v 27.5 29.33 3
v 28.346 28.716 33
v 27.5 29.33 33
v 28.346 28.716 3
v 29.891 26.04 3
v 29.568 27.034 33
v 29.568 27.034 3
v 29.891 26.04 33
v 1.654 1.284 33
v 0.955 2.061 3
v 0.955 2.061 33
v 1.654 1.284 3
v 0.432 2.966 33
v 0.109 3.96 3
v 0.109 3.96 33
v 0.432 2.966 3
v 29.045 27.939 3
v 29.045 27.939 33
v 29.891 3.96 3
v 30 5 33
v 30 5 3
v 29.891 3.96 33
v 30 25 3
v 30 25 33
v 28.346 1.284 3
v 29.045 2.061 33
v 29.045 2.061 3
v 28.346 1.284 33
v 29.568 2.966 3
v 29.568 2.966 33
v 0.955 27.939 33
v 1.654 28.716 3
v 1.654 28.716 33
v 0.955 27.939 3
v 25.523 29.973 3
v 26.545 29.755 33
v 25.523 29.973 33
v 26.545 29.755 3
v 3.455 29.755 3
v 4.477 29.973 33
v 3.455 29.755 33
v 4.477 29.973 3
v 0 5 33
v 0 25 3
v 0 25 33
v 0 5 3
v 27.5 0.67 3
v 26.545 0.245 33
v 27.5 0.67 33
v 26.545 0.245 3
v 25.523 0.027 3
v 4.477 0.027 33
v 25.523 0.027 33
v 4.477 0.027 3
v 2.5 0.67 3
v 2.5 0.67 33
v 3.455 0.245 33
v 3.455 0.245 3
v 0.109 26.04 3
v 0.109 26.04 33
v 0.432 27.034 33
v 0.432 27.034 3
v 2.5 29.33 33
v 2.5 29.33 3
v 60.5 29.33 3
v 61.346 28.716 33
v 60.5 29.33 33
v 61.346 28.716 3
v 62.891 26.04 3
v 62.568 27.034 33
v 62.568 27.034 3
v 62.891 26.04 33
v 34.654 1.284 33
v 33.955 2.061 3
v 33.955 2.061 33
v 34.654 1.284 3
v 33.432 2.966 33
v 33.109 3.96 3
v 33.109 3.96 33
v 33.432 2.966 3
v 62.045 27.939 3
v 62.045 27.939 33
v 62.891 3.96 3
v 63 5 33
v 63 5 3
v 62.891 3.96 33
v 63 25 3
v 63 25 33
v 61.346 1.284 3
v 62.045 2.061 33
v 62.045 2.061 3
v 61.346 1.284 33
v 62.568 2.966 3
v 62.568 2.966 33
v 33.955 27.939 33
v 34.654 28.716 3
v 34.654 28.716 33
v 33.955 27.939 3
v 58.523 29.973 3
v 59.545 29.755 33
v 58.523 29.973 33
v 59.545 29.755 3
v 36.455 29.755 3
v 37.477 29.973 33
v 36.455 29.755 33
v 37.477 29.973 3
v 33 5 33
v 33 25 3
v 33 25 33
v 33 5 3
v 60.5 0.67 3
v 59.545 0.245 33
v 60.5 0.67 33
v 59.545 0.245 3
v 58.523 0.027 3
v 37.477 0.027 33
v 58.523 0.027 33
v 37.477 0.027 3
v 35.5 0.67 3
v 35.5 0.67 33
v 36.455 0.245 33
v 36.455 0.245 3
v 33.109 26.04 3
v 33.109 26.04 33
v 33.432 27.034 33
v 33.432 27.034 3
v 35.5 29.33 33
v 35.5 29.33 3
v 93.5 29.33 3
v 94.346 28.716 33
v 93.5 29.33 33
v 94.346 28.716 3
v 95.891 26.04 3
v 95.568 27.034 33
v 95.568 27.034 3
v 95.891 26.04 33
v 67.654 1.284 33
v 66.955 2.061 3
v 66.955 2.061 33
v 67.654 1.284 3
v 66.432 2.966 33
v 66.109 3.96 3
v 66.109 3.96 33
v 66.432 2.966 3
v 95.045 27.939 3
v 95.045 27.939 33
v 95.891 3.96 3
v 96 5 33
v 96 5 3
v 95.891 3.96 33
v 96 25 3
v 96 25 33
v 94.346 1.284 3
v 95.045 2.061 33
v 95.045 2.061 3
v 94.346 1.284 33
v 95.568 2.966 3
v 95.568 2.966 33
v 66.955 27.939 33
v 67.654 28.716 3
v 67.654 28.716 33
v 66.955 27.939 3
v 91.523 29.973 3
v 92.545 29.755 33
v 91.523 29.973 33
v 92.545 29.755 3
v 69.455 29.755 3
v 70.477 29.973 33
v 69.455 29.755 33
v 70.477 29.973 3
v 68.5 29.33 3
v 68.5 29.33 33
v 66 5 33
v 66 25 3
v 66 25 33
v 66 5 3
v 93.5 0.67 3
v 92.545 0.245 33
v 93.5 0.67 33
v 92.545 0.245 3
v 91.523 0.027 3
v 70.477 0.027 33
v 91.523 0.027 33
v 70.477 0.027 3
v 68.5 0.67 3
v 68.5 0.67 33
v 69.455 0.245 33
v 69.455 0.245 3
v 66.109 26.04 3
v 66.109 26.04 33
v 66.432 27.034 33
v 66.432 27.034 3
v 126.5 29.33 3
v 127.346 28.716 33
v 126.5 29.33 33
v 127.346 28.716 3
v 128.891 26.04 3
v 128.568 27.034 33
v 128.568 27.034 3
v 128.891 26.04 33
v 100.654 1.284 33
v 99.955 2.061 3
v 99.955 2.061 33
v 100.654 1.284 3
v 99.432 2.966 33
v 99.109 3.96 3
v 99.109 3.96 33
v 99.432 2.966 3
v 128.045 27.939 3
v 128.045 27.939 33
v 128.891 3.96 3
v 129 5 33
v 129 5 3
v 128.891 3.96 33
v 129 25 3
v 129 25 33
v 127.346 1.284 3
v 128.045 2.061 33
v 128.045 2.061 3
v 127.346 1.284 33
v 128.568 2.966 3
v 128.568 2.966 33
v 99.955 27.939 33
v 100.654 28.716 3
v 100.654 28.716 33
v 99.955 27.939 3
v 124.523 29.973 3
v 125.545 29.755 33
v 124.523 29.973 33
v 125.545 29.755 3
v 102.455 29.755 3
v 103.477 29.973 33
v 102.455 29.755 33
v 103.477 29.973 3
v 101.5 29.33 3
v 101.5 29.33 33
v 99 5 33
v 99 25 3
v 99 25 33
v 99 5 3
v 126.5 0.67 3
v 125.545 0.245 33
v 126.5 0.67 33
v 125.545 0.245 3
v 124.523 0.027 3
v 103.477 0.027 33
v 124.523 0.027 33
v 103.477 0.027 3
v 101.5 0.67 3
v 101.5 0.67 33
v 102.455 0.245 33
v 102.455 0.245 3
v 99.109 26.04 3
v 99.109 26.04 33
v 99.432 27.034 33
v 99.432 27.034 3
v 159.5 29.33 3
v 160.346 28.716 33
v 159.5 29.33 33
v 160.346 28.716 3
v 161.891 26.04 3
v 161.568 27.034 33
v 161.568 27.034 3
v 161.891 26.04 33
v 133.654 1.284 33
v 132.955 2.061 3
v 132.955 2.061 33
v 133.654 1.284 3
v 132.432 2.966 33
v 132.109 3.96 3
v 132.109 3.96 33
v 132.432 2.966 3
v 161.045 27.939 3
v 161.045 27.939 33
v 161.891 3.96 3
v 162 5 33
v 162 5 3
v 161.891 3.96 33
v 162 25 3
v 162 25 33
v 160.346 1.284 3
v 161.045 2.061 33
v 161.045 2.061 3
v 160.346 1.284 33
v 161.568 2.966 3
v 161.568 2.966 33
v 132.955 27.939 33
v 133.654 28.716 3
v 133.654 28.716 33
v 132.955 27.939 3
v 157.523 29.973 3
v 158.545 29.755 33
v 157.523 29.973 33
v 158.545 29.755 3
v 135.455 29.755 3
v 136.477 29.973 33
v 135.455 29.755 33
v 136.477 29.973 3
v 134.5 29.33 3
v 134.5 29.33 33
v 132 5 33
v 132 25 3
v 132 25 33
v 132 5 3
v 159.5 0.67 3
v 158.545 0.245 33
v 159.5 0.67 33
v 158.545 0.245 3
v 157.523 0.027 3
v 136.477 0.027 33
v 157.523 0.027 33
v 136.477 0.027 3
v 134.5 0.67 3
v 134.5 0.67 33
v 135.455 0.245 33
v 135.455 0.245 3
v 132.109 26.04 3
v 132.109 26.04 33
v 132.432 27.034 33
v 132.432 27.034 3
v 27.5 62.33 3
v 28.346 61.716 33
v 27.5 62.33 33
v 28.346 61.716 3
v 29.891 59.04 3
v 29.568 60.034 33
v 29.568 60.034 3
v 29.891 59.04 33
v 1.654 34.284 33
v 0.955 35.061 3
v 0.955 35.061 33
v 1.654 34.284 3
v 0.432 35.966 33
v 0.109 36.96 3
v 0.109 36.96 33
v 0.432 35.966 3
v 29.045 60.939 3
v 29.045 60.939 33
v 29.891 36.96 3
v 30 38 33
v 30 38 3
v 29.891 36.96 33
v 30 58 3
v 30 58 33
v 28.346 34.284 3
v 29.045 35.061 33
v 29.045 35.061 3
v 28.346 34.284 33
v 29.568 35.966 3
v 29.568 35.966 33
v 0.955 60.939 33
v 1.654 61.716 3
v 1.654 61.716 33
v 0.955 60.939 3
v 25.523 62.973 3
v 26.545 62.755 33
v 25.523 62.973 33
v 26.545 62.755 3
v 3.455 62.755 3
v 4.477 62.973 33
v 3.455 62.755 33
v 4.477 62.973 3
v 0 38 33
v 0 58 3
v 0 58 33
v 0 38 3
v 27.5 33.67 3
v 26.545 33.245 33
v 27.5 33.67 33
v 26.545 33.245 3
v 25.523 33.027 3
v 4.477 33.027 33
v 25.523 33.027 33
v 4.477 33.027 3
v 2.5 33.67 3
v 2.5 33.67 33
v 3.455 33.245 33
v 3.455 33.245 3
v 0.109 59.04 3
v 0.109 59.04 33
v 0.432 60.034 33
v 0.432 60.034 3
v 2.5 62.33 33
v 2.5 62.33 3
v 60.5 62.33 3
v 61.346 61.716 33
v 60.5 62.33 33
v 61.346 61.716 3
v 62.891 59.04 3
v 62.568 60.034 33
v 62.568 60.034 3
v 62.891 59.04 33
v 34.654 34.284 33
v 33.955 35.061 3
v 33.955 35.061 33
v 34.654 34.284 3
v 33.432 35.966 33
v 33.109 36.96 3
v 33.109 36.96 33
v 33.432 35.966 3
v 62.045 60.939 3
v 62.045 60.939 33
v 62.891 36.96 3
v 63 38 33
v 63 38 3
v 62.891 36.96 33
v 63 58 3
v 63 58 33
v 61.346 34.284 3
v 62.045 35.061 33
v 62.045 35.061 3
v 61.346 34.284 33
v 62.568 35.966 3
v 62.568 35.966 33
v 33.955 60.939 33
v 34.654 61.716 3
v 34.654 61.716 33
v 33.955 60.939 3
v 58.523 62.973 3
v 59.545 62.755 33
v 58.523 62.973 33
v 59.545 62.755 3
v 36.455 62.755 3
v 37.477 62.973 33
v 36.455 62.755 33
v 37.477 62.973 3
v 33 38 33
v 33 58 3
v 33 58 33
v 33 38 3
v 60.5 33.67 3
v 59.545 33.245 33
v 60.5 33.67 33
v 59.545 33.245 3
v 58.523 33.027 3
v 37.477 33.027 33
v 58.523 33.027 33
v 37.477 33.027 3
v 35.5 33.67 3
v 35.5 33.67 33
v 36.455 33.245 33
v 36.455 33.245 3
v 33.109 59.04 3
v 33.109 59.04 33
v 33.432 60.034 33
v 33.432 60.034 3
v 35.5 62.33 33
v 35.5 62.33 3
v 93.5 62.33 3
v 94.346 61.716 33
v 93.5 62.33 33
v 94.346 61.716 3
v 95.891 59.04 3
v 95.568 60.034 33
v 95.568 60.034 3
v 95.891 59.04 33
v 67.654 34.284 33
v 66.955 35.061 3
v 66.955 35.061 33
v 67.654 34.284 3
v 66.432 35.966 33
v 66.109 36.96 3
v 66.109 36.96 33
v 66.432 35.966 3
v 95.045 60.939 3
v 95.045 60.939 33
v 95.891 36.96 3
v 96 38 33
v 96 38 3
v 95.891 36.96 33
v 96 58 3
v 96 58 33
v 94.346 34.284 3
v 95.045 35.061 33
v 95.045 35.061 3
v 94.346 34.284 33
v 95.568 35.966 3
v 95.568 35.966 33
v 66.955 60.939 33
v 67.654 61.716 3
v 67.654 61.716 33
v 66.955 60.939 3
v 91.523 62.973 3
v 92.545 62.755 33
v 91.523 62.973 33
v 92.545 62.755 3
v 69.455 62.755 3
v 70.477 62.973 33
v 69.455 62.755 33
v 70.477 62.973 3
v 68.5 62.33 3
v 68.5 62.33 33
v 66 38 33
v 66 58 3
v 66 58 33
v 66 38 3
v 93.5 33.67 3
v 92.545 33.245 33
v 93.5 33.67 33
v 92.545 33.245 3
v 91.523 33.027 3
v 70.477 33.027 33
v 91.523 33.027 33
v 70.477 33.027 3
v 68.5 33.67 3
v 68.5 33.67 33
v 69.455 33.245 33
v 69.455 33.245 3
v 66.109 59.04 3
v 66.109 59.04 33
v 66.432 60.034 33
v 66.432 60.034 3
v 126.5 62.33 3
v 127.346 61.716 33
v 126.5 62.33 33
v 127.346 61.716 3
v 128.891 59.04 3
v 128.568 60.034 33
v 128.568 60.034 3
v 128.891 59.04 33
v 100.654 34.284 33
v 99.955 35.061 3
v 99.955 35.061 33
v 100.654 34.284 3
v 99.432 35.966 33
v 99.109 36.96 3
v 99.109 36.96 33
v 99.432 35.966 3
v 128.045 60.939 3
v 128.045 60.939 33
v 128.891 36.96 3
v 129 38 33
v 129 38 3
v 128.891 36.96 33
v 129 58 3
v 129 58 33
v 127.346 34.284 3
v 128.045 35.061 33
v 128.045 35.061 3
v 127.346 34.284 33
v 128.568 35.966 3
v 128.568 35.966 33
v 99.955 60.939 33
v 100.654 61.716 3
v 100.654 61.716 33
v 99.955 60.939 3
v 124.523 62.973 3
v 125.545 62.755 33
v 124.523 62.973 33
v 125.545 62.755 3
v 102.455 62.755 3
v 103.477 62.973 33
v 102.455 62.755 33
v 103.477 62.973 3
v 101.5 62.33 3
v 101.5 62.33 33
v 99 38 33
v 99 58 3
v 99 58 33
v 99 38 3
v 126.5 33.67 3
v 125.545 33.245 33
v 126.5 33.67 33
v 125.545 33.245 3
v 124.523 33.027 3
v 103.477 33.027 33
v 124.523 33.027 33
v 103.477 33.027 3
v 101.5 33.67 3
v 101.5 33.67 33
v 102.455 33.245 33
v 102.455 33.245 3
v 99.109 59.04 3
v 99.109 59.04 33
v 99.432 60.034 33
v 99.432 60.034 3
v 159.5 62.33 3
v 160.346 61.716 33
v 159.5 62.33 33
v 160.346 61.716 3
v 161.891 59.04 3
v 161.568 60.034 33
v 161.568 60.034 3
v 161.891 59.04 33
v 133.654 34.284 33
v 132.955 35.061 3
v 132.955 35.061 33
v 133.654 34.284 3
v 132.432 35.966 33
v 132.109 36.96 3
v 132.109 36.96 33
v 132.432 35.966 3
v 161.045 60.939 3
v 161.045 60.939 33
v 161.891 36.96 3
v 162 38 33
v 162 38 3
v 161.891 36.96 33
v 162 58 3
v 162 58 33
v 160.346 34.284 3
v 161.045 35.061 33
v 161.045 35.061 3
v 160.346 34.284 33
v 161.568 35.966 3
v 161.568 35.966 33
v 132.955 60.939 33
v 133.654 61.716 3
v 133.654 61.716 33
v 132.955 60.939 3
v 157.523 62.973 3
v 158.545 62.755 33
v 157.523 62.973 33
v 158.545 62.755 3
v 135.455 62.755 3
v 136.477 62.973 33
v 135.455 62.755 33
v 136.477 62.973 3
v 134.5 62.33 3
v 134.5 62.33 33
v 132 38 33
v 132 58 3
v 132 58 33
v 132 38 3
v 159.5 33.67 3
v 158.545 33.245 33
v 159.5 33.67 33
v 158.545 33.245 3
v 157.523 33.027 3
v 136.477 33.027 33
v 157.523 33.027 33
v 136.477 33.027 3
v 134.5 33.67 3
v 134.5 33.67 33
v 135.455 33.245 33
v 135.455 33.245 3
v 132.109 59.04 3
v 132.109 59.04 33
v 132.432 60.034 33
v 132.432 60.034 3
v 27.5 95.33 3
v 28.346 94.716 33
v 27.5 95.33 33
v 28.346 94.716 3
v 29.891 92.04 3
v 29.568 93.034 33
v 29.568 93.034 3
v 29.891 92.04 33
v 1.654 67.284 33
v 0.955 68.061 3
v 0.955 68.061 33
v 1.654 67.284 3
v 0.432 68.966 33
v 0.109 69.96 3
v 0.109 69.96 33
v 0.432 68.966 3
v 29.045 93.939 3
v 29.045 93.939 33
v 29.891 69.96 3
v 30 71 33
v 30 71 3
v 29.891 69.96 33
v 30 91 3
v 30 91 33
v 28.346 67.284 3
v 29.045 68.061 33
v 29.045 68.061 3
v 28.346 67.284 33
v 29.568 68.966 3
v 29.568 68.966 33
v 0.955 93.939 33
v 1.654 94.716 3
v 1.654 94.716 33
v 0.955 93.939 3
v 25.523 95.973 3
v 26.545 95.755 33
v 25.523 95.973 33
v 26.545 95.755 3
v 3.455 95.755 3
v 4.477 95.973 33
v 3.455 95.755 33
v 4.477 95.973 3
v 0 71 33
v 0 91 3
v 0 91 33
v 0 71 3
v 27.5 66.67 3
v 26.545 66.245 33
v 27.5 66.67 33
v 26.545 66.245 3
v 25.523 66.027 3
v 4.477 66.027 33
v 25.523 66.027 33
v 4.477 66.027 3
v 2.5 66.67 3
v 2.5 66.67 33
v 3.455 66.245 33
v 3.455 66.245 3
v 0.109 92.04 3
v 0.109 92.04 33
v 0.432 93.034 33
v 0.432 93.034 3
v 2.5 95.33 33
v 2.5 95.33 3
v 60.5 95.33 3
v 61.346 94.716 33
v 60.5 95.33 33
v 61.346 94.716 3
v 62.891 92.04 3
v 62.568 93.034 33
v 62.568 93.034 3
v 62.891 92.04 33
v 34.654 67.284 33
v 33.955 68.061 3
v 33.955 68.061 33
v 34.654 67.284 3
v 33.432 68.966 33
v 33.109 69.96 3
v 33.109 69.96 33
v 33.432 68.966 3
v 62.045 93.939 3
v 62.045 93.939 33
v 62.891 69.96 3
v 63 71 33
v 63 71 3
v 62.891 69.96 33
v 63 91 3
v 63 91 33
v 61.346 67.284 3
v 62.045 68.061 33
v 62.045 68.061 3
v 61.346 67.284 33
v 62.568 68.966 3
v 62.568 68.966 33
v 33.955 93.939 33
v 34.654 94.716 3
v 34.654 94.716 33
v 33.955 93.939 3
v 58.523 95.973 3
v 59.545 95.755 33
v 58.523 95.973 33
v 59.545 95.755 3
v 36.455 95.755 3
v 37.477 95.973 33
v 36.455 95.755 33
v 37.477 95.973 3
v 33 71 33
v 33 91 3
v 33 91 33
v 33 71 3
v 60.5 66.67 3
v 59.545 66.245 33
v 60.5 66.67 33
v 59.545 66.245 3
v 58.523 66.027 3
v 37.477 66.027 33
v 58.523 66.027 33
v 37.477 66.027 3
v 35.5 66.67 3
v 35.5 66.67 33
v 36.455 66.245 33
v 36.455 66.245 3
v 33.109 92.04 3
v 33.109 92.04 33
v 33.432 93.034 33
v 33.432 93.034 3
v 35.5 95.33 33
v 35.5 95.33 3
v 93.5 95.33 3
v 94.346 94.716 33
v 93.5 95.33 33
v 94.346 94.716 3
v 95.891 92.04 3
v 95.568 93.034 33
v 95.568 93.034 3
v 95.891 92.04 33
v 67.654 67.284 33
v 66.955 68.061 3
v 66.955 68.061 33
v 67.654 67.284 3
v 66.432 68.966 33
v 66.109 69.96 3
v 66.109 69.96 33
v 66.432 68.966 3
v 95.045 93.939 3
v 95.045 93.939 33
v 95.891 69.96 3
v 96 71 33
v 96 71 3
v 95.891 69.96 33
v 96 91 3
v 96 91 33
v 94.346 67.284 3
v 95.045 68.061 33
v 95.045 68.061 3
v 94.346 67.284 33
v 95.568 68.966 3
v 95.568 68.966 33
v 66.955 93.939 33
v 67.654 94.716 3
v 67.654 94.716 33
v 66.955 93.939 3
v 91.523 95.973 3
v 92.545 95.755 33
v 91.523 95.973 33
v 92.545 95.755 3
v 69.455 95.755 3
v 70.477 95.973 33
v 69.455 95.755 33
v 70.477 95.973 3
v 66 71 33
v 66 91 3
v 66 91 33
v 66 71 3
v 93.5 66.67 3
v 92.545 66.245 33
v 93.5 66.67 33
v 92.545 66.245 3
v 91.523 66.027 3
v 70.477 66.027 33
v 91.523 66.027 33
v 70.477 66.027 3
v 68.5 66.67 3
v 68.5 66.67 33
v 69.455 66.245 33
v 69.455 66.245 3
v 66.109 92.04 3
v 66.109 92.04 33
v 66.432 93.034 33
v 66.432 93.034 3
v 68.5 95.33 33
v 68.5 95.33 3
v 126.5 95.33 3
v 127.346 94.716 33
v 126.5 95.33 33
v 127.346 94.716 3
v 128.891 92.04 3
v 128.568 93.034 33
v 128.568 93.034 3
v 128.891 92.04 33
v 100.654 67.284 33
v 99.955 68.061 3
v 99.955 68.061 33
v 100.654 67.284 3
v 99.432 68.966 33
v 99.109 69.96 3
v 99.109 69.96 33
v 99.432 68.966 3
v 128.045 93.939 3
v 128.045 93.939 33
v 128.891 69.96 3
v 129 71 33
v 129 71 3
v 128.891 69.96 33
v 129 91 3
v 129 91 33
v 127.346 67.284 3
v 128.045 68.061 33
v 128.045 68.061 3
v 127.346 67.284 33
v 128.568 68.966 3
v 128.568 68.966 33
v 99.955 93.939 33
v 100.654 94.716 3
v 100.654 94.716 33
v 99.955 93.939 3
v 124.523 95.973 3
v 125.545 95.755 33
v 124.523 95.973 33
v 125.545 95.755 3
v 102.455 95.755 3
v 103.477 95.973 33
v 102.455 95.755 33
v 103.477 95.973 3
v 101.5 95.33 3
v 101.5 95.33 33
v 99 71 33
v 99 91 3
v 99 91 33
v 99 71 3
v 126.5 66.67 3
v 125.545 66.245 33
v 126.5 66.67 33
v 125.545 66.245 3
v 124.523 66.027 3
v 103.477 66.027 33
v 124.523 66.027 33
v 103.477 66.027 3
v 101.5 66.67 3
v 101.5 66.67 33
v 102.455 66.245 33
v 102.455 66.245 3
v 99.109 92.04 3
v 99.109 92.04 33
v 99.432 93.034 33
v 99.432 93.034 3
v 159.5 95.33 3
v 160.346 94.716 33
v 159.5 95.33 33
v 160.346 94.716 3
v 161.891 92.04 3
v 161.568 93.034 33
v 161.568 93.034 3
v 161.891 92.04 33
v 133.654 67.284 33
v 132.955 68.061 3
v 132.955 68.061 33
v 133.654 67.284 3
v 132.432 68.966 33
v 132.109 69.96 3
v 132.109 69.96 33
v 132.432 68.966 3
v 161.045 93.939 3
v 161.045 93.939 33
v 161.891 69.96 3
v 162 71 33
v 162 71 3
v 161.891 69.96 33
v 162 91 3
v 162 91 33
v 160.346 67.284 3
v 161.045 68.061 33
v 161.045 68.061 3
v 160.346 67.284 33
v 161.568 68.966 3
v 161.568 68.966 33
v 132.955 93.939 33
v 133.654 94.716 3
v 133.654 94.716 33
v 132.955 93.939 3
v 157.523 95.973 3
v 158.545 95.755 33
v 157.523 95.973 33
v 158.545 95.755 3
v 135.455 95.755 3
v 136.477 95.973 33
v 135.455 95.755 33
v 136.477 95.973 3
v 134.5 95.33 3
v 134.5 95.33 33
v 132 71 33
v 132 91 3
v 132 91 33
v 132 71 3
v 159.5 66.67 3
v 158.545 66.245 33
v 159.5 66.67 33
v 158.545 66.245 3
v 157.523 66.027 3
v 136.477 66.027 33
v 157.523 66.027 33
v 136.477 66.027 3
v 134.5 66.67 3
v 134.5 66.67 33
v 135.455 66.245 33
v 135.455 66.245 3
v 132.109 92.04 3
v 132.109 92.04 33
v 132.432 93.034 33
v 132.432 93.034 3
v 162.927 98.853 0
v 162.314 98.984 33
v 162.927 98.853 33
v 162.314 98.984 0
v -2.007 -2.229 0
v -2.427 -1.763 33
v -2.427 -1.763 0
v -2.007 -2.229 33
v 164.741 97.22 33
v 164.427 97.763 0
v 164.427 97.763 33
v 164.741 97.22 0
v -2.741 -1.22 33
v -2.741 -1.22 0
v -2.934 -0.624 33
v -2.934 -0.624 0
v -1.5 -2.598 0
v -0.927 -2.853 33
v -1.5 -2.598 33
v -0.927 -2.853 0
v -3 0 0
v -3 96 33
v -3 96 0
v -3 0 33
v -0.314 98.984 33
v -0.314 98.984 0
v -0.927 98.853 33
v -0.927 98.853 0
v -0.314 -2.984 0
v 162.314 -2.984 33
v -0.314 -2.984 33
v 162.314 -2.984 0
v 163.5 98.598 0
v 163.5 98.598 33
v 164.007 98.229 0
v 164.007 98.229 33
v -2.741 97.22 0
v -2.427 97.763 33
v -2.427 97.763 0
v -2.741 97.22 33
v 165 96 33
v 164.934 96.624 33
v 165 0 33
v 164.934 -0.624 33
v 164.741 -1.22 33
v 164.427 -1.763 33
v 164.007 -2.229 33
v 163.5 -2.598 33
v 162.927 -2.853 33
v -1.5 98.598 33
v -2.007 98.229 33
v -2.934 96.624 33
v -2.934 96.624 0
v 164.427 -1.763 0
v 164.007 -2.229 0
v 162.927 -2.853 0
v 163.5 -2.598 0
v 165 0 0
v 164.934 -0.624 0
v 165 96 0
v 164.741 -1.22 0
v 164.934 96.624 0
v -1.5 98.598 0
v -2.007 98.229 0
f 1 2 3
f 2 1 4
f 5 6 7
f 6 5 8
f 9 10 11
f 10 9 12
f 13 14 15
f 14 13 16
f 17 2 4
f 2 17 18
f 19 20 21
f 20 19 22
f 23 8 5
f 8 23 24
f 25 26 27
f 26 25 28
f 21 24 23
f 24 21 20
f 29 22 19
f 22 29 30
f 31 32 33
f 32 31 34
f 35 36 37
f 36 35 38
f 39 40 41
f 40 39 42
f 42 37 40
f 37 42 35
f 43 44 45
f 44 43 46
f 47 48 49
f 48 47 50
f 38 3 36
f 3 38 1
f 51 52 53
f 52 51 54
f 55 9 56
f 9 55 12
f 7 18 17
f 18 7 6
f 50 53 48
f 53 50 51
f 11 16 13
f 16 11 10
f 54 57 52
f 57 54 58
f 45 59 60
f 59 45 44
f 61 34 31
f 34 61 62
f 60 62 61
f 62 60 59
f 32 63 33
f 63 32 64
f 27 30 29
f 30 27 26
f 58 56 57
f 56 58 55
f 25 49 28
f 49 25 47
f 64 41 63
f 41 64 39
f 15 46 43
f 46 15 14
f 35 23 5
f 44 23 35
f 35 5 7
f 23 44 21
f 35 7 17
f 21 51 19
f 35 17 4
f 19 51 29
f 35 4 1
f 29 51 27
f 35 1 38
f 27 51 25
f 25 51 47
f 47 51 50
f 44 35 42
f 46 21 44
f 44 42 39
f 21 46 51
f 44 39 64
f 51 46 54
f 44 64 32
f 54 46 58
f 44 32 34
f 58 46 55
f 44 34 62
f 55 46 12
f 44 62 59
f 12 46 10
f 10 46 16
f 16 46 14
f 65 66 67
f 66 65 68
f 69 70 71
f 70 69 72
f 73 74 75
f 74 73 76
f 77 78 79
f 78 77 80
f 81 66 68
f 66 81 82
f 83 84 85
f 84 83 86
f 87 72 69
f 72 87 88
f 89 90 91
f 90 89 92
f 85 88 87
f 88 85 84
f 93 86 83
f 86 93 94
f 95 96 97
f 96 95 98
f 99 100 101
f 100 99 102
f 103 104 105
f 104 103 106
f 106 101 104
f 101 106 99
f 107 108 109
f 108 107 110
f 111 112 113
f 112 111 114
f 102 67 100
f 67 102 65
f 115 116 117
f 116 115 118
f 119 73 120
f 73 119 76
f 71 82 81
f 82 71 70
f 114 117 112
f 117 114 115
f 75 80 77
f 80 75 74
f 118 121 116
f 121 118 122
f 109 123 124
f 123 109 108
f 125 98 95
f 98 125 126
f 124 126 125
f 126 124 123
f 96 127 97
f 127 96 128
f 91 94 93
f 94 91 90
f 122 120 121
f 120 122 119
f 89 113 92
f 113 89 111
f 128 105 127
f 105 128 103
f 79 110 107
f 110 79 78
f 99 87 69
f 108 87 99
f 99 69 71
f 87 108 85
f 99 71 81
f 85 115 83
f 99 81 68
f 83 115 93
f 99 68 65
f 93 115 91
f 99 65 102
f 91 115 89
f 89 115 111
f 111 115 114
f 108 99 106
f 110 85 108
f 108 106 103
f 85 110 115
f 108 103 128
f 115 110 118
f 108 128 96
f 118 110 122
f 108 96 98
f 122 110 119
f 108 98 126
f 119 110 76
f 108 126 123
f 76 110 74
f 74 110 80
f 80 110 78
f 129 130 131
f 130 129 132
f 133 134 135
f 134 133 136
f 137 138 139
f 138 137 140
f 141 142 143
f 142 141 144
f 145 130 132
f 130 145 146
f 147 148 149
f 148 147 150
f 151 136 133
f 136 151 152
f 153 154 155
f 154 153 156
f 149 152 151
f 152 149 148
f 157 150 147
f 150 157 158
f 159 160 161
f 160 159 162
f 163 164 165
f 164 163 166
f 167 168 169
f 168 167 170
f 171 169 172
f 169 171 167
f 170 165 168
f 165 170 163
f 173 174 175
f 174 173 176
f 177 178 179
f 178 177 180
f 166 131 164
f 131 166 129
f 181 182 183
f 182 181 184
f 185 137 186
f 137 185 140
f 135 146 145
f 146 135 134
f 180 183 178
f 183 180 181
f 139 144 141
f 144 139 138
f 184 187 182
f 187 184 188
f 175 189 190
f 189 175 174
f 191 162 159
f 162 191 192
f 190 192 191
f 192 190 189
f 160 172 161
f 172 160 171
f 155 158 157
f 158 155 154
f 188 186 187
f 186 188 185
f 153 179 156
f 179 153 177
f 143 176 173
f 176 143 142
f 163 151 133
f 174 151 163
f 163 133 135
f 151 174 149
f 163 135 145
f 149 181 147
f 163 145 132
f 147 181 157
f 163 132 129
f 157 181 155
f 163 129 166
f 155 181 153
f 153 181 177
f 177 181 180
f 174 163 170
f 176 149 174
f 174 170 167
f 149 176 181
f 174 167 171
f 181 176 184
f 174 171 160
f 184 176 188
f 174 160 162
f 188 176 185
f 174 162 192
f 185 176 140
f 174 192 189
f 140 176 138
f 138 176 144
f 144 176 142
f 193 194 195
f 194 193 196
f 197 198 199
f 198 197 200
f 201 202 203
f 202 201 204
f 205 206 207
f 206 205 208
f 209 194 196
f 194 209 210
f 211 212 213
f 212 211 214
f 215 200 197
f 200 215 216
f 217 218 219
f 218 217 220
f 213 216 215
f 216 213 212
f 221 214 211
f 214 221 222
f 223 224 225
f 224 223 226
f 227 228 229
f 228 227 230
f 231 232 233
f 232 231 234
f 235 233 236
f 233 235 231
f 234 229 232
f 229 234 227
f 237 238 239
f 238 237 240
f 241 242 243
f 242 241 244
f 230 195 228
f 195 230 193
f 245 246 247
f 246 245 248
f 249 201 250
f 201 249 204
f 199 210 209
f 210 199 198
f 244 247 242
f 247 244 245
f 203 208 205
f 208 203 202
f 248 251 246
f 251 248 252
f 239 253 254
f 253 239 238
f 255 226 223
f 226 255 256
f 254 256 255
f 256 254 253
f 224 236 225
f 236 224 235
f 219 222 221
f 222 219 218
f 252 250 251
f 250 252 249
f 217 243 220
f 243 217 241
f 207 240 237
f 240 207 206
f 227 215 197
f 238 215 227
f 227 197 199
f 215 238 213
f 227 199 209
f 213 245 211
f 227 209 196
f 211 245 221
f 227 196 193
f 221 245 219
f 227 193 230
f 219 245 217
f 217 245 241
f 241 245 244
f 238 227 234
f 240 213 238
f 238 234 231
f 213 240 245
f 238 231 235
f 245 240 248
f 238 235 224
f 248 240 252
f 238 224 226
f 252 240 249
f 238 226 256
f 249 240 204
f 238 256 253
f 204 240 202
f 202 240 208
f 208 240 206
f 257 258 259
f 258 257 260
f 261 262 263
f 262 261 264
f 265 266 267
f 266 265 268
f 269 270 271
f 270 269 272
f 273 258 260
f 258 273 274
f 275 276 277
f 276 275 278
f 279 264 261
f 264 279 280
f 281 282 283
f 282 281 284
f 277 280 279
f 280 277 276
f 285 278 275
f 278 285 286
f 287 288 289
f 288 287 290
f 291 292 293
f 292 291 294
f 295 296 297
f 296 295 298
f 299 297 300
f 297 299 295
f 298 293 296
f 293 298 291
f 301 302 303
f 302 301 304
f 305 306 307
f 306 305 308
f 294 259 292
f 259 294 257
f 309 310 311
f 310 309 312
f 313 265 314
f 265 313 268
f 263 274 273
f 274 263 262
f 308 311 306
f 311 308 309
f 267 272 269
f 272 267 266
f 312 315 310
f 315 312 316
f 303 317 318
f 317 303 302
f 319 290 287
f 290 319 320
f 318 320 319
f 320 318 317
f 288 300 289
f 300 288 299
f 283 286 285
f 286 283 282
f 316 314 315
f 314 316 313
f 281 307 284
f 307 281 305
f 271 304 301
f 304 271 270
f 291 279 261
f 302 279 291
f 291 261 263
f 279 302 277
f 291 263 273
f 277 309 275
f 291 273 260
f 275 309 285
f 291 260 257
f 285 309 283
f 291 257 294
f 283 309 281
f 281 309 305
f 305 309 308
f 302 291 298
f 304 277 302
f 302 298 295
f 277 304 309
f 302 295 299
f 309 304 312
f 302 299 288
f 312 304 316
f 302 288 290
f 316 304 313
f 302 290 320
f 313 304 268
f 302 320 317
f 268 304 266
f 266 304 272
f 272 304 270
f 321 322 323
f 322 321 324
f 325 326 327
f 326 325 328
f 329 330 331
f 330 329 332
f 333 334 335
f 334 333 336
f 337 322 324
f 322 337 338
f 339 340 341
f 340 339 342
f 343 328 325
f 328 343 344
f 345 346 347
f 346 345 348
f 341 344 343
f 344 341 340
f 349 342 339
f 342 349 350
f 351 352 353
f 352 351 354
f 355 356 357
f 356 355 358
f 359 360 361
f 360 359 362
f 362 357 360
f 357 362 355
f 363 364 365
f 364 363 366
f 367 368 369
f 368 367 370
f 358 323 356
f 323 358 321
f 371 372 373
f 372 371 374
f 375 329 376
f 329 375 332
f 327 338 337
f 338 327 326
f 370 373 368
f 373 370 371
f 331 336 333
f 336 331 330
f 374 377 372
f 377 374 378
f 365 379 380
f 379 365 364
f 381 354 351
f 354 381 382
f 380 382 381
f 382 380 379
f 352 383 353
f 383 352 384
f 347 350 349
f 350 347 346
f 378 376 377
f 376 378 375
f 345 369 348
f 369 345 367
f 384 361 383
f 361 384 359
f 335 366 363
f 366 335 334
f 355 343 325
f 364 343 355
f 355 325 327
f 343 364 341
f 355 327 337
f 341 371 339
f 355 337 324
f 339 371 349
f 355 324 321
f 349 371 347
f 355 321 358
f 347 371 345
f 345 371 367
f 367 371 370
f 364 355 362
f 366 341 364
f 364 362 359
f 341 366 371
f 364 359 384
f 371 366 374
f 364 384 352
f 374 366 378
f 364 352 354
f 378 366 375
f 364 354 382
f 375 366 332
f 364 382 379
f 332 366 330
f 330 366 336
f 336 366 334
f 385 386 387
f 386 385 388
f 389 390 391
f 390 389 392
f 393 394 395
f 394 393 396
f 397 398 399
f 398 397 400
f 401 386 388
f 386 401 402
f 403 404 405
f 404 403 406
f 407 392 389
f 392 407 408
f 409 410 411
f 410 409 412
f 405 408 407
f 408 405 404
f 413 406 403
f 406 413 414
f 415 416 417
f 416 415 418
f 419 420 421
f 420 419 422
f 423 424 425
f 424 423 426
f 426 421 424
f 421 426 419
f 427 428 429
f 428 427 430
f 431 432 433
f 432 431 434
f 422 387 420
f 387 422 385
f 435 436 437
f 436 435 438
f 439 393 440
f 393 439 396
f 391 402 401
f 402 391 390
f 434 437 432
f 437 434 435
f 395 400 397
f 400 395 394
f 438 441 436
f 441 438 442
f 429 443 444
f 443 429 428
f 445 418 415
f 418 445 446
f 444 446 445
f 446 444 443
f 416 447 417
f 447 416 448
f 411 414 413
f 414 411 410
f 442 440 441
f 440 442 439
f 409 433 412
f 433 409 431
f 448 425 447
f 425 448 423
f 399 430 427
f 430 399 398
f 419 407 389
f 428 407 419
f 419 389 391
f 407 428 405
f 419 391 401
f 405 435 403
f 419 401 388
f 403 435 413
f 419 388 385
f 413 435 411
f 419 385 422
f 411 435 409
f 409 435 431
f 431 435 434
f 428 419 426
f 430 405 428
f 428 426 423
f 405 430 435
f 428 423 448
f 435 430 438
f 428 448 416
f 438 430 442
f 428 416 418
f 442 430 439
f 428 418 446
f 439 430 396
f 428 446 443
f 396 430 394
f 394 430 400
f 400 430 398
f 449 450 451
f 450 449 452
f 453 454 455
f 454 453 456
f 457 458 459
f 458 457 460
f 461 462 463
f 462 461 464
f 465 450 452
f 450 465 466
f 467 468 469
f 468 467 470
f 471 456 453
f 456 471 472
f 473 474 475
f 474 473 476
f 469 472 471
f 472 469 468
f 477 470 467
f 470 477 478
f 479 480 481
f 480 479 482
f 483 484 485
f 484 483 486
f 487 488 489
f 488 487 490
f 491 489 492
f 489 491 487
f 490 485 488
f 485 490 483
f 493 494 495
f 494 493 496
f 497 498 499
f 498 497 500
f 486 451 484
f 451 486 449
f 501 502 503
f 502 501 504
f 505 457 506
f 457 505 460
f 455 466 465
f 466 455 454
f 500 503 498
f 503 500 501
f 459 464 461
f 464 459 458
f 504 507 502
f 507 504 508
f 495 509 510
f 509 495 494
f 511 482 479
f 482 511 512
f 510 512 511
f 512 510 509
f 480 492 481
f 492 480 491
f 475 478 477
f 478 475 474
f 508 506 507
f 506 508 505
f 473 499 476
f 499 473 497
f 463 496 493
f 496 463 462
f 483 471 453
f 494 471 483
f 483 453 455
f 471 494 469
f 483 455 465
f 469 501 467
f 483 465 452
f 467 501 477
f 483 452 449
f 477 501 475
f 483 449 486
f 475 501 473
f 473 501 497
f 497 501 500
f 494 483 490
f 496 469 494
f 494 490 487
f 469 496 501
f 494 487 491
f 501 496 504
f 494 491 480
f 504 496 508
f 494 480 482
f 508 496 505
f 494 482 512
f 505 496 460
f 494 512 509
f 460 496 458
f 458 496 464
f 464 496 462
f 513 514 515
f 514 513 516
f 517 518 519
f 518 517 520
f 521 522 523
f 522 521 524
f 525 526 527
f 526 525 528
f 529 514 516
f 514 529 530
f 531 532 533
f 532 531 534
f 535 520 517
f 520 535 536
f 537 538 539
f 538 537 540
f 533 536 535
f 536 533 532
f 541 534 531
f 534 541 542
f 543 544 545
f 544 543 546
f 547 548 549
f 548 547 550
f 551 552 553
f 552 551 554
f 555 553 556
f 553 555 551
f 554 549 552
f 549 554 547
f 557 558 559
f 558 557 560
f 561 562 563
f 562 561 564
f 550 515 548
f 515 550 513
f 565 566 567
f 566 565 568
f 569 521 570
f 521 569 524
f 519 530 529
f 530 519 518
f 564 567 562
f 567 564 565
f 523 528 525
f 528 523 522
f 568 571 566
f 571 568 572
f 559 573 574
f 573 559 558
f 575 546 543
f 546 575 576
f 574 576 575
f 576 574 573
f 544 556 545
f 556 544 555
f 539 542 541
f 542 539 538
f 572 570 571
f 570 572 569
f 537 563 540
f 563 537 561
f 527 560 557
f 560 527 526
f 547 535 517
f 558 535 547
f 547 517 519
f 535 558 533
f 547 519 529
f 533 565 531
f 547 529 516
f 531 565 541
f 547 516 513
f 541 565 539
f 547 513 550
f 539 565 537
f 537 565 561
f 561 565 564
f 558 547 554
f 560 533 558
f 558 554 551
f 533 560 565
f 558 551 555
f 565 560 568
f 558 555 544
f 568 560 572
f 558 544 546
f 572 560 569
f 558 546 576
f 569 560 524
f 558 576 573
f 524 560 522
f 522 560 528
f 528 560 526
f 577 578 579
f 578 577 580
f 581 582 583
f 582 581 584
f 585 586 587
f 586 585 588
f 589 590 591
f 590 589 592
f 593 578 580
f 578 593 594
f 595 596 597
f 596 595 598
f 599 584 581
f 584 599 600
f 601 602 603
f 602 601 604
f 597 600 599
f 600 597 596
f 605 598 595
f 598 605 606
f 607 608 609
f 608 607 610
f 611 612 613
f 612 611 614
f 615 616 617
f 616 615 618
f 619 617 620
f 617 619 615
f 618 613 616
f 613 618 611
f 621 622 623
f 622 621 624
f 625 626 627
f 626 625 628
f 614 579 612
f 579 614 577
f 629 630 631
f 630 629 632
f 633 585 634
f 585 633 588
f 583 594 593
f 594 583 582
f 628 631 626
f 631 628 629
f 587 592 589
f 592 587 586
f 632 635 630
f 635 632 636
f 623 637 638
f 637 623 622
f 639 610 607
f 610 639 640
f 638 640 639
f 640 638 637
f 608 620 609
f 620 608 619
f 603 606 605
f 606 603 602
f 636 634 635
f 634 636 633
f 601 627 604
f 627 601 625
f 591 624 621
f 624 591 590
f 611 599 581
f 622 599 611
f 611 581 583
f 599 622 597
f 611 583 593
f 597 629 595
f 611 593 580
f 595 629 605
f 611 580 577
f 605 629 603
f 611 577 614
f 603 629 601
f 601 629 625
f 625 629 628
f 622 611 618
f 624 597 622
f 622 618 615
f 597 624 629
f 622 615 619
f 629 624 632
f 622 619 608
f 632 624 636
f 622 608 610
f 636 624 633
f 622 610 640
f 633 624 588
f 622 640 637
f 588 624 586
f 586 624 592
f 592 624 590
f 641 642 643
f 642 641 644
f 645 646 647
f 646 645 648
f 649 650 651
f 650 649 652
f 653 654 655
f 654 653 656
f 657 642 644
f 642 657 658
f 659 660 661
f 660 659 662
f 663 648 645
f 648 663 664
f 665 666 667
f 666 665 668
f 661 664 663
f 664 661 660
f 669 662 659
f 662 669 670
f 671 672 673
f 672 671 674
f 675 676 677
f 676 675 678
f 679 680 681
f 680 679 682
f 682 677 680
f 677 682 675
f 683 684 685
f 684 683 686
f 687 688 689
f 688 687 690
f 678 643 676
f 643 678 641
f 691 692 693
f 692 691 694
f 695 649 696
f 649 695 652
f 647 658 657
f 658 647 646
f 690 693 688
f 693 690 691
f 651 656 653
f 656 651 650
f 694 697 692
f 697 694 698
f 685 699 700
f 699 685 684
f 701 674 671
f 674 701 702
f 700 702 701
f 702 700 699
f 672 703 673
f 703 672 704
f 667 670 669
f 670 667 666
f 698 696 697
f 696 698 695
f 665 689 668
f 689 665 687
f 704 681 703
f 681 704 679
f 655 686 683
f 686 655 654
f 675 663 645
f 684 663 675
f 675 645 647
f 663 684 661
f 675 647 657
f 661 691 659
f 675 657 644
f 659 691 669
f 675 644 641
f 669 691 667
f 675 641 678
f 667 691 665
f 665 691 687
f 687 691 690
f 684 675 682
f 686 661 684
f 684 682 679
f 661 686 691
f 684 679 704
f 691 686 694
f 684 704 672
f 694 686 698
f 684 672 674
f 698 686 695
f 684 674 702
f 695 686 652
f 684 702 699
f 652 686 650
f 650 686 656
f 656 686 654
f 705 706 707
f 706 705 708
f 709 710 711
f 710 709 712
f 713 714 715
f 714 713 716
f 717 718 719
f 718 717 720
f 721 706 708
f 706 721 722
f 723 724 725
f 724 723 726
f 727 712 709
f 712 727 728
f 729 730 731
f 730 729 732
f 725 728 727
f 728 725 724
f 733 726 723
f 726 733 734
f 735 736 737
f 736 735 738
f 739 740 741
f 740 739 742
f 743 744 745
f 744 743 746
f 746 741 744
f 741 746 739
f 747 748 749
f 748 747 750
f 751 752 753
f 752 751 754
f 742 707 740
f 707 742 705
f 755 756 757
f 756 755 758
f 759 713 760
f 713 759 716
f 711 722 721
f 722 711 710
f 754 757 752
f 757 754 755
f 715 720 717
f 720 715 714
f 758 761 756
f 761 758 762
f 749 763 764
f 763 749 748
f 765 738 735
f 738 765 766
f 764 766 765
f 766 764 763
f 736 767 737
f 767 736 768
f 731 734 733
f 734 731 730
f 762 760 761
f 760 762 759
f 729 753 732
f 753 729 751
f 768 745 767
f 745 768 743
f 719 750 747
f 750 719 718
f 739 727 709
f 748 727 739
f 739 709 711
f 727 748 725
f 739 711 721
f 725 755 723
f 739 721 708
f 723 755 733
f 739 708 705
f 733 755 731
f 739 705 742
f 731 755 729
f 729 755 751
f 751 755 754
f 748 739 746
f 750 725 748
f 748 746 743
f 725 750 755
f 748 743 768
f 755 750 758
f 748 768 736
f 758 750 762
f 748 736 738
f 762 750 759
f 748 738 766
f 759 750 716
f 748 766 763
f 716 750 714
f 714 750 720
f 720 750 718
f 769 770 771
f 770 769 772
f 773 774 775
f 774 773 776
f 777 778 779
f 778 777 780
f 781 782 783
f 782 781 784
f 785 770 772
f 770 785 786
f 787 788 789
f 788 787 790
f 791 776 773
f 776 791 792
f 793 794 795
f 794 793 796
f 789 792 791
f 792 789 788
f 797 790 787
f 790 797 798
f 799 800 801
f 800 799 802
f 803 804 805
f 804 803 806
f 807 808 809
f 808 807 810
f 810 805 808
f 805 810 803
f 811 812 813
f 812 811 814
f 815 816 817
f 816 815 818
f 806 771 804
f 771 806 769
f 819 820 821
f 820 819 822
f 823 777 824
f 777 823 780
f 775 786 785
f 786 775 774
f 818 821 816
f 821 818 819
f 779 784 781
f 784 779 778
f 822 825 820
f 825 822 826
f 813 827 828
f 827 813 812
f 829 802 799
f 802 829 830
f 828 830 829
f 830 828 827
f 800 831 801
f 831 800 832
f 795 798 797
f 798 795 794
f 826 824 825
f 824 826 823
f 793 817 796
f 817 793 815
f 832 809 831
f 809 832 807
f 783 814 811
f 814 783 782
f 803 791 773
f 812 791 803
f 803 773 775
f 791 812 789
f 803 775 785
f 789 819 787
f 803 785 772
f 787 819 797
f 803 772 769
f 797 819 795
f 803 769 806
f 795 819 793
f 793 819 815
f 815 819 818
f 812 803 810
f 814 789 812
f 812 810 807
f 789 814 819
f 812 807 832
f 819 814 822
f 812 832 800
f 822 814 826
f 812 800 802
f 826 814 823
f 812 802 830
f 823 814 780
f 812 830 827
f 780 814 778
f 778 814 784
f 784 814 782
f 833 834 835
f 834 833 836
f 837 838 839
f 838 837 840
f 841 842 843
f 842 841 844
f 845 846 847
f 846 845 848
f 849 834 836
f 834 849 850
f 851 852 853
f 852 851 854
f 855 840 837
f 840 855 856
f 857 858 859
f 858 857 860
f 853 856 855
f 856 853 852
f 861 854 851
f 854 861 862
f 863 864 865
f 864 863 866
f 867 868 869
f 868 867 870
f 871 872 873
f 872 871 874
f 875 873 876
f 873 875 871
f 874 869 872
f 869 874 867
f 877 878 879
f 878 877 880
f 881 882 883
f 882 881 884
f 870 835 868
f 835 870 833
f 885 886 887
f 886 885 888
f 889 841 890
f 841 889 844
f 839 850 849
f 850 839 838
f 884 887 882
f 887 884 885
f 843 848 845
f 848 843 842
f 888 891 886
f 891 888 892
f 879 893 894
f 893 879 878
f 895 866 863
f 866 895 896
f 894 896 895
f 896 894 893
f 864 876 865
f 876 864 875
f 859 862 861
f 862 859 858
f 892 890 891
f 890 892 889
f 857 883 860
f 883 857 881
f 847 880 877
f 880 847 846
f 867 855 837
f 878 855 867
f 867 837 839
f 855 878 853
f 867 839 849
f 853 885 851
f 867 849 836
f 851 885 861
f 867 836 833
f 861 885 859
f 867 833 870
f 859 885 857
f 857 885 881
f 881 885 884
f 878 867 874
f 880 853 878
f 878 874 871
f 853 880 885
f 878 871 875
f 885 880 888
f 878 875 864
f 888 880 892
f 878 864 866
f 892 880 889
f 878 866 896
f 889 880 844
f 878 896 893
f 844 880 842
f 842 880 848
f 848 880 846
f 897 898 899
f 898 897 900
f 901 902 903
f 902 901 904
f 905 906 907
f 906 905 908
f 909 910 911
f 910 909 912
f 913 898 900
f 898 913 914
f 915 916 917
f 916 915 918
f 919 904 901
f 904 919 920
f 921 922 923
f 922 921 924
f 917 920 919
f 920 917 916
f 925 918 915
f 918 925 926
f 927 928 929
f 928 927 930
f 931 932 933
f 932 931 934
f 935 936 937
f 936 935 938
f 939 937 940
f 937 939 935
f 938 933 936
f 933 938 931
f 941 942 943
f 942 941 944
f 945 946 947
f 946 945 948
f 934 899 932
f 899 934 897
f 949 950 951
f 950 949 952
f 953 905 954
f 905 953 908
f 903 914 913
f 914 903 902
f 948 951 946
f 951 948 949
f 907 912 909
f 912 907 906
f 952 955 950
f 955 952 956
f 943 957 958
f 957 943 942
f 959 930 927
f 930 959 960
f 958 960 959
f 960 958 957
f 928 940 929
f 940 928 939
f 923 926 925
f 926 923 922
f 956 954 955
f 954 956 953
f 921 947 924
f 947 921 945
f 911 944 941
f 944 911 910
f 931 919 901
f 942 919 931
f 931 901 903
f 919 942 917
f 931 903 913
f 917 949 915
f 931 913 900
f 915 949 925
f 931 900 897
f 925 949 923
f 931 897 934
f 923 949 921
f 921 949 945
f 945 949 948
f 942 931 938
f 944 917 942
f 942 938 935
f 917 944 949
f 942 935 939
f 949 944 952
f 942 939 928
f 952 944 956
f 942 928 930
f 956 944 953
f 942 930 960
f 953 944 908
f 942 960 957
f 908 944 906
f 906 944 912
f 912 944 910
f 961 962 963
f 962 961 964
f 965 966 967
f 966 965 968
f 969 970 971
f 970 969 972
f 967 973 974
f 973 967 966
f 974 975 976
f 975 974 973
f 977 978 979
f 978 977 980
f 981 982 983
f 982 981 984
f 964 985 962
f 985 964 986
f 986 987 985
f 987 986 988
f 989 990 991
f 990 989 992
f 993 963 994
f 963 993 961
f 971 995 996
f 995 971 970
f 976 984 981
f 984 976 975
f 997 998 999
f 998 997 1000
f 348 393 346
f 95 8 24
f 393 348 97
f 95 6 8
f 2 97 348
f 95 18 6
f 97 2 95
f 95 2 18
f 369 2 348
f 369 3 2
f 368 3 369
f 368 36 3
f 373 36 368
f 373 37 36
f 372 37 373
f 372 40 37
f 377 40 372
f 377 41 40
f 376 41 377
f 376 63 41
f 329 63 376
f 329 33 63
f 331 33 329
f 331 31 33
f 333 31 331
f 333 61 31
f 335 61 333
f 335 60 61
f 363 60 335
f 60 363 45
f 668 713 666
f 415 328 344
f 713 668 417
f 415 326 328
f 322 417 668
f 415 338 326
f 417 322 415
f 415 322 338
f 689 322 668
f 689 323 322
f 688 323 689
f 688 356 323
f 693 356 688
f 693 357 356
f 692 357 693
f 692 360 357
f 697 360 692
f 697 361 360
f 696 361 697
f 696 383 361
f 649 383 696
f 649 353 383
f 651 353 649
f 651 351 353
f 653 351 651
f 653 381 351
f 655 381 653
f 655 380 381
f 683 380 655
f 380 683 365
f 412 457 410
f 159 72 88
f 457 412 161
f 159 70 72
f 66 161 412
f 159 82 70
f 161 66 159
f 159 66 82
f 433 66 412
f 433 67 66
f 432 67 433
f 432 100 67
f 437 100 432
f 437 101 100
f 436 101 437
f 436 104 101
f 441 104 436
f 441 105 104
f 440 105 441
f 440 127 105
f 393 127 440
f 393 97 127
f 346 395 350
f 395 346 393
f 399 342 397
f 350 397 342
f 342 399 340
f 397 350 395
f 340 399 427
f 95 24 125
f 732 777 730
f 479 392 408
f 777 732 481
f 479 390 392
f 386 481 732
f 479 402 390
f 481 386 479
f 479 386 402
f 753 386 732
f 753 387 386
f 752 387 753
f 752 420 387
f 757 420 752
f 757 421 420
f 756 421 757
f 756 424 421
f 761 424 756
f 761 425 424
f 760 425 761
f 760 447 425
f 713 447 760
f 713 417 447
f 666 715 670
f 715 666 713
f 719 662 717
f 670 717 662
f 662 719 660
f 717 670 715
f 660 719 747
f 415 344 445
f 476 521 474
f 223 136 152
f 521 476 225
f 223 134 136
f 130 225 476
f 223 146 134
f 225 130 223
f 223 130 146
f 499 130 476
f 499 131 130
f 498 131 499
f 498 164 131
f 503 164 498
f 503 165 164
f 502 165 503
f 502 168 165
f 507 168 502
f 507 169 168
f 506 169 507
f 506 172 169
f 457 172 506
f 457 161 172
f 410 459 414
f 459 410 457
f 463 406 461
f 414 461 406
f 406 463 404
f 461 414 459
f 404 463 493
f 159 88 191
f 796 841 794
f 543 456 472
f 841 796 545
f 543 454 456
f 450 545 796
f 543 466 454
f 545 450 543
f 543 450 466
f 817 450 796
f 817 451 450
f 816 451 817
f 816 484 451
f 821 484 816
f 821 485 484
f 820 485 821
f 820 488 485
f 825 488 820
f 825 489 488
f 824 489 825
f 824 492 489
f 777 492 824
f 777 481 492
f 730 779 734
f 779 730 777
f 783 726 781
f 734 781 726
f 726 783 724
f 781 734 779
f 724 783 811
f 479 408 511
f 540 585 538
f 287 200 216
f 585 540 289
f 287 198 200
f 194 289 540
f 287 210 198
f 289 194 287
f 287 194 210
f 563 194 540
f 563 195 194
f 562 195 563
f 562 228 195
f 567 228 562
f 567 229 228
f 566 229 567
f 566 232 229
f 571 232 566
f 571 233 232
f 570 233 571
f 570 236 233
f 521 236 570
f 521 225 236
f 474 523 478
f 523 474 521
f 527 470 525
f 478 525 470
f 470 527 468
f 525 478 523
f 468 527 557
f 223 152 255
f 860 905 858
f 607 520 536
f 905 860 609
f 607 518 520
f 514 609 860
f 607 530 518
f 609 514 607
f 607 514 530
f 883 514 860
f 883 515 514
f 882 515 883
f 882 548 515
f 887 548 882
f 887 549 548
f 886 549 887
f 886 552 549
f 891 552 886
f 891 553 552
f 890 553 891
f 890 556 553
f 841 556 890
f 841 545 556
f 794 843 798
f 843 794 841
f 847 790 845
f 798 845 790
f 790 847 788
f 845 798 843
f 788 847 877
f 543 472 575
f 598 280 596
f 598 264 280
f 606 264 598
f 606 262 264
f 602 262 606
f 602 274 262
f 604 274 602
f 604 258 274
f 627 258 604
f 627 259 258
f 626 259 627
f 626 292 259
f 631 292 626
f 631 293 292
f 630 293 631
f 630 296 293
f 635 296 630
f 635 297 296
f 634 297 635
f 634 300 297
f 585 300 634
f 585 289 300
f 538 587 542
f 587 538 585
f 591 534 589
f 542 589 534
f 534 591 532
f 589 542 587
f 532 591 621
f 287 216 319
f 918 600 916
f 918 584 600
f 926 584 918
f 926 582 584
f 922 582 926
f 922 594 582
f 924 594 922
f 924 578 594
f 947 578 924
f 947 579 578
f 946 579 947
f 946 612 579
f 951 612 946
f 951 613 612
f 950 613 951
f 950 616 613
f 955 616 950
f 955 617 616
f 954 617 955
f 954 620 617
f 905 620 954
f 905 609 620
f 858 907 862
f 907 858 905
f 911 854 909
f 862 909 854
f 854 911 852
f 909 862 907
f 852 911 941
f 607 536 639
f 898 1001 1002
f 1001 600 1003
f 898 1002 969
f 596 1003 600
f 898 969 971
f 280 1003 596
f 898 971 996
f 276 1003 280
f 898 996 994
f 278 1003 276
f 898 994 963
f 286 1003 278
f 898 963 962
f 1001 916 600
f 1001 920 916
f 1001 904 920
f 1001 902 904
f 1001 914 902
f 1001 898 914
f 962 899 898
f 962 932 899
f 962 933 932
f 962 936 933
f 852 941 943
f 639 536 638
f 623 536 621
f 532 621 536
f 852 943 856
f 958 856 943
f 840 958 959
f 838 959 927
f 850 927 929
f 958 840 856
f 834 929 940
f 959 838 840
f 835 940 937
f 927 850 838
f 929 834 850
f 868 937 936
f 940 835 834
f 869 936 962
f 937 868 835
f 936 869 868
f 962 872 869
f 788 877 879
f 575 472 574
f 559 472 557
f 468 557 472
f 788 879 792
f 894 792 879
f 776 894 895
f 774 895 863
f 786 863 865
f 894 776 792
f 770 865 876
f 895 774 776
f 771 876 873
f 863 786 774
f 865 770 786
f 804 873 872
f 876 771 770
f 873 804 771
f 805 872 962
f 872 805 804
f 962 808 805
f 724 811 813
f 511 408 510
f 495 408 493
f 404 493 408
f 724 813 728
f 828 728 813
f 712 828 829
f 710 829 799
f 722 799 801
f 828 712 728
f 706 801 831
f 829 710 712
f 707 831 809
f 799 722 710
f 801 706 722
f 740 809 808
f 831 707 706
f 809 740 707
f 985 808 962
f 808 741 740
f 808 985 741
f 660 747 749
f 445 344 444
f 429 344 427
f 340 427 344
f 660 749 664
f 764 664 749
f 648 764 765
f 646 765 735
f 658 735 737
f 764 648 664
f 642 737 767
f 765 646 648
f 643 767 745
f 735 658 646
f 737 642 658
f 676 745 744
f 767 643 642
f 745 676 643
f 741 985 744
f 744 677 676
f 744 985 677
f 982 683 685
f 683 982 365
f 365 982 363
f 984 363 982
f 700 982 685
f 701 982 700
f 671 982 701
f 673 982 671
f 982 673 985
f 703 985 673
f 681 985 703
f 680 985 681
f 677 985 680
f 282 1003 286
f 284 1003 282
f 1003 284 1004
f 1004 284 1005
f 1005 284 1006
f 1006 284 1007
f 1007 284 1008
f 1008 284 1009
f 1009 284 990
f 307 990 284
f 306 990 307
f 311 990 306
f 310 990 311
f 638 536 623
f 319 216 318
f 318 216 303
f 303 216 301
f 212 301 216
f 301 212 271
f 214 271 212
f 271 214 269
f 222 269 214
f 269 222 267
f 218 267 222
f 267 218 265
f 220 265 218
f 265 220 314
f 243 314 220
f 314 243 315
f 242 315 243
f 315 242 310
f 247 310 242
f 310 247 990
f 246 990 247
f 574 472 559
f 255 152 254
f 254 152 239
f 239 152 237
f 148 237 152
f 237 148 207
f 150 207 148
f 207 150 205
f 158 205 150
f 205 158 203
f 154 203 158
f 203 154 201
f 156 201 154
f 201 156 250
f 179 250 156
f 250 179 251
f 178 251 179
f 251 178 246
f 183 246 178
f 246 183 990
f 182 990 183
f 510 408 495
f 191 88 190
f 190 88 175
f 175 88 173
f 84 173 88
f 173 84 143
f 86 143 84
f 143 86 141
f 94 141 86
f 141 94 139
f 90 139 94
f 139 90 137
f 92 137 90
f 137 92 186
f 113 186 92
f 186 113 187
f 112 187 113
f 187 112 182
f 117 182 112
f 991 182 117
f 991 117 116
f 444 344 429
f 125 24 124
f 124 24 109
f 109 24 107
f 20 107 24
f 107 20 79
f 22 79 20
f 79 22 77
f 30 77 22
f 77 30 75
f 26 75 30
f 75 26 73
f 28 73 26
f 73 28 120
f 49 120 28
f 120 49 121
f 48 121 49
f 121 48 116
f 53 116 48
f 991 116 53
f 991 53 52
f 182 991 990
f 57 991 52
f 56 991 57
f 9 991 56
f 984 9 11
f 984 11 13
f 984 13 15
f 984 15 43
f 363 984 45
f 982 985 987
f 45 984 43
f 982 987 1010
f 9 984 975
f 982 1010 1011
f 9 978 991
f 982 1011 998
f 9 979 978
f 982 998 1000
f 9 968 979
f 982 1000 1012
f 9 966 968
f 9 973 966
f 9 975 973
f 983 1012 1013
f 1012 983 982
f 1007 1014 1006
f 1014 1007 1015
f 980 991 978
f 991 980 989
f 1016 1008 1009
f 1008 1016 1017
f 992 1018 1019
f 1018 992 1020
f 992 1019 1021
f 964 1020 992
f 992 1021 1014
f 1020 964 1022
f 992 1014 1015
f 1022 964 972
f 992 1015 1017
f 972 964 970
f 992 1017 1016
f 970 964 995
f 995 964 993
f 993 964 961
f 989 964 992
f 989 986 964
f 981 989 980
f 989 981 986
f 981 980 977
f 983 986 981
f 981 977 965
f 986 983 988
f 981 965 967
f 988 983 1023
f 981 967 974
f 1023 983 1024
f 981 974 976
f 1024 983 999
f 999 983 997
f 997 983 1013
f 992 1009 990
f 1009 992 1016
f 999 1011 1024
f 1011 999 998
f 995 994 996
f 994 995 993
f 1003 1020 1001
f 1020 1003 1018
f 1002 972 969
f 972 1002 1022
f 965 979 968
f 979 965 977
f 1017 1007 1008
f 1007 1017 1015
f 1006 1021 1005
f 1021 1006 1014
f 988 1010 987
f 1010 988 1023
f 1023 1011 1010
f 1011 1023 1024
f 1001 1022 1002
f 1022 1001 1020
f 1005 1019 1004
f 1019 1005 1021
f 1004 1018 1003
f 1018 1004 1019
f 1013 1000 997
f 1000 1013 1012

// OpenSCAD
numberOfColumns = 5; 
numberOfRows = 3; 

singleBoxWidth = 30;
singleBoxHeight = 30;

baseHeight = 3; 
boxHeight = 30; 

internalWallThickness = 3;
externalWallThickness = 3;

internalRadius = 5;
quality=30; // [10:60]

// ignore
$fn=quality;


module roundbox(r,wi,he,dz) {
	hull()
	{
		cube([wi, he, dz]);
		translate([0,0,0])
			cylinder(r=r, h=dz);
		translate([wi, 0, 0])
			cylinder(r=r, h=dz);
		translate([wi, he, 0])
			cylinder(r=r, h=dz);
		translate([0, he, 0])
			cylinder(r=r, h=dz);
	}

}


module organizer() {
	difference() {
	   roundbox(externalWallThickness, numberOfColumns*singleBoxWidth+(numberOfColumns-1)*internalWallThickness, numberOfRows*singleBoxHeight+(numberOfRows-1)*internalWallThickness, baseHeight+boxHeight);
	   for (y=[0:numberOfRows-1])
			for (x=[0:numberOfColumns-1]) {
				translate([(internalWallThickness+singleBoxWidth)*x, (internalWallThickness+singleBoxHeight)*y, baseHeight]) {
				translate([internalRadius,internalRadius,0])
					roundbox(internalRadius,singleBoxWidth-2*internalRadius,singleBoxHeight-2*internalRadius, boxHeight+1);
			}
		}
	}
}


organizer();
